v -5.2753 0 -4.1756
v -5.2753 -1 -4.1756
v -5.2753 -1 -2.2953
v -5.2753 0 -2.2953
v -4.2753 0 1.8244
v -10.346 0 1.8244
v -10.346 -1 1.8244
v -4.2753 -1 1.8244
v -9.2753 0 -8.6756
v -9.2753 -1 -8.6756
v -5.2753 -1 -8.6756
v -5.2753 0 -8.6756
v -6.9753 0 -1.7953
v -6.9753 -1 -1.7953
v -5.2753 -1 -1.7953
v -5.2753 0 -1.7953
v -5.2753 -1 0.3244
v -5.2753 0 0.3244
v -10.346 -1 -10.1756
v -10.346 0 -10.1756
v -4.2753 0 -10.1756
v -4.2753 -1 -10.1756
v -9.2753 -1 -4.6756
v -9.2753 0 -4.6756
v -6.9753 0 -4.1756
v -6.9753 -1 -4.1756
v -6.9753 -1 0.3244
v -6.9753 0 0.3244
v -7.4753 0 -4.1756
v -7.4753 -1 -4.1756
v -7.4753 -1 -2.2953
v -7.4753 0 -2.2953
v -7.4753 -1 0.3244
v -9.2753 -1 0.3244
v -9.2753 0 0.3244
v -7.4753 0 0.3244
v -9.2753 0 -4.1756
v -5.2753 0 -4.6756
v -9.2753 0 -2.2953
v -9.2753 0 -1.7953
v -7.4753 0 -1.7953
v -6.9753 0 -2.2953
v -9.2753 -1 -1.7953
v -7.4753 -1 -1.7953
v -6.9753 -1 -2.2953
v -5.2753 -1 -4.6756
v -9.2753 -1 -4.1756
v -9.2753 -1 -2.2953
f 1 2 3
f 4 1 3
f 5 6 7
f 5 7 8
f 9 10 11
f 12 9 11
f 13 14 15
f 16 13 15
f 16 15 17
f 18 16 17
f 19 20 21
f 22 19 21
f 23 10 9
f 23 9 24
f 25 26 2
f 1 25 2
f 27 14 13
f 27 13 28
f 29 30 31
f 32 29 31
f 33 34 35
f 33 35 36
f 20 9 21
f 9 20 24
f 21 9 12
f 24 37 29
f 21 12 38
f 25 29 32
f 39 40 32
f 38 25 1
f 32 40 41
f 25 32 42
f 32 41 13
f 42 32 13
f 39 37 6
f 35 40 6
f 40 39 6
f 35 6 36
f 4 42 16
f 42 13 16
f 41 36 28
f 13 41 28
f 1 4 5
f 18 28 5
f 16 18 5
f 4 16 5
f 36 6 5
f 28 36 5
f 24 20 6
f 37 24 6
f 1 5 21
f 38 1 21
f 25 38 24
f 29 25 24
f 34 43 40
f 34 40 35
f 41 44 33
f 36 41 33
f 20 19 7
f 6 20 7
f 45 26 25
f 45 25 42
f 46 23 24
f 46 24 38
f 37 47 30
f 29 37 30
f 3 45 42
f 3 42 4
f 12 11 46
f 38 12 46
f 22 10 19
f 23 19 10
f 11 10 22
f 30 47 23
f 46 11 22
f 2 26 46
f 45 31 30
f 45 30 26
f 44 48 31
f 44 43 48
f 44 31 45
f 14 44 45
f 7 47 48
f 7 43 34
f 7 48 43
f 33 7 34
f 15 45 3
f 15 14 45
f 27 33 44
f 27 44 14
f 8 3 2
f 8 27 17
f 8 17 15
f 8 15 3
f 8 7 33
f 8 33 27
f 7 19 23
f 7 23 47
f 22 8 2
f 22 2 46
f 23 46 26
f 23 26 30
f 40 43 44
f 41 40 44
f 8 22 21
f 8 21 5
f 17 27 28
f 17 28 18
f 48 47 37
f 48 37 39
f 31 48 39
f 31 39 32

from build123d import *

# Parameters (mm, degrees)
SKETCH_W        = 23
SKETCH_H        = 12
PAD_DEPTH       = 1
SKETCH001_W     = 4
SKETCH001_H     = 4
SKETCH001_W_2   = 9
SKETCH001_W_3   = 1.8
SKETCH001_H_2   = 2.119738
SKETCH001_W_4   = 1.7
SKETCH001_H_3   = 1.880262
SKETCH001_H_4   = 2.108956
SKETCH001_W_5   = 1.95
SKETCH001_H_5   = 1.880263
SKETCH001_H_6   = 2.119737
POCKET_DEPTH    = 5
SKETCH002_W     = 16
SKETCH002_H     = 12
POCKET001_DEPTH = 5
SKETCH003_W     = 0.92929
SKETCH003_H     = 12
POCKET002_DEPTH = 5


with BuildPart() as part:
    # Sketch → Pad (new body)
    with BuildSketch(Plane.XZ):
        with Locations((0.224666, -4.175566)):
            Rectangle(SKETCH_W, SKETCH_H)
    extrude(amount=PAD_DEPTH)

    # Sketch001 (on Face6 of Pad) → Pocket (cut)
    with BuildSketch(Plane.XZ.offset(1)):
        with Locations((-7.275334, -6.675566)):
            Rectangle(SKETCH001_W, SKETCH001_H)
        with Locations((7.724666, -6.675566)):
            Rectangle(SKETCH001_W, SKETCH001_H)
        with Locations((0.224666, -6.675566)):
            Rectangle(SKETCH001_W_2, SKETCH001_H)
        with Locations((-8.375334, -0.735435)):
            Rectangle(SKETCH001_W_3, SKETCH001_H_2)
        with Locations((-6.125334, -0.735435)):
            Rectangle(SKETCH001_W_4, SKETCH001_H_2)
        with Locations((-8.375334, -3.235435)):
            Rectangle(SKETCH001_W_3, SKETCH001_H_3)
        with Locations((-6.125334, -3.235435)):
            Rectangle(SKETCH001_W_4, SKETCH001_H_3)
        with Locations((-3.375334, -0.730044)):
            Rectangle(SKETCH001_W_3, SKETCH001_H_4)
        with Locations((-1.000334, -0.730044)):
            Rectangle(SKETCH001_W_5, SKETCH001_H_4)
        with Locations((-3.375334, -3.224654)):
            Rectangle(SKETCH001_W_3, SKETCH001_H_5)
        with Locations((-1.000334, -3.224654)):
            Rectangle(SKETCH001_W_5, SKETCH001_H_5)
        with Locations((1.374666, -0.730044)):
            Rectangle(SKETCH001_W_3, SKETCH001_H_4)
        with Locations((3.674666, -0.724653)):
            Rectangle(SKETCH001_W_3, SKETCH001_H_6)
        with Locations((1.374666, -3.224654)):
            Rectangle(SKETCH001_W_3, SKETCH001_H_5)
        with Locations((3.749666, -3.224654)):
            Rectangle(SKETCH001_W_5, SKETCH001_H_5)
        with Locations((6.624666, -0.732224)):
            Rectangle(SKETCH001_W_3, SKETCH001_H_2)
        with Locations((8.874666, -0.732224)):
            Rectangle(SKETCH001_W_4, SKETCH001_H_2)
        with Locations((6.624666, -3.232224)):
            Rectangle(SKETCH001_W_3, SKETCH001_H_3)
        with Locations((8.874666, -3.232224)):
            Rectangle(SKETCH001_W_4, SKETCH001_H_3)
    extrude(amount=-POCKET_DEPTH, mode=Mode.SUBTRACT)

    # Sketch002 (on Face5 of Pocket) → Pocket001 (cut)
    with BuildSketch(Plane.XZ.offset(1)):
        with Locations((3.724666, -4.175566)):
            Rectangle(SKETCH002_W, SKETCH002_H)
    extrude(amount=-POCKET001_DEPTH, mode=Mode.SUBTRACT)

    # Sketch003 (on Face4 of Pocket001) → Pocket002 (cut)
    with BuildSketch(Plane.XZ.offset(1)):
        with Locations((-10.810689, -4.175566)):
            Rectangle(SKETCH003_W, SKETCH003_H)
    extrude(amount=-POCKET002_DEPTH, mode=Mode.SUBTRACT)


solid = part.part
